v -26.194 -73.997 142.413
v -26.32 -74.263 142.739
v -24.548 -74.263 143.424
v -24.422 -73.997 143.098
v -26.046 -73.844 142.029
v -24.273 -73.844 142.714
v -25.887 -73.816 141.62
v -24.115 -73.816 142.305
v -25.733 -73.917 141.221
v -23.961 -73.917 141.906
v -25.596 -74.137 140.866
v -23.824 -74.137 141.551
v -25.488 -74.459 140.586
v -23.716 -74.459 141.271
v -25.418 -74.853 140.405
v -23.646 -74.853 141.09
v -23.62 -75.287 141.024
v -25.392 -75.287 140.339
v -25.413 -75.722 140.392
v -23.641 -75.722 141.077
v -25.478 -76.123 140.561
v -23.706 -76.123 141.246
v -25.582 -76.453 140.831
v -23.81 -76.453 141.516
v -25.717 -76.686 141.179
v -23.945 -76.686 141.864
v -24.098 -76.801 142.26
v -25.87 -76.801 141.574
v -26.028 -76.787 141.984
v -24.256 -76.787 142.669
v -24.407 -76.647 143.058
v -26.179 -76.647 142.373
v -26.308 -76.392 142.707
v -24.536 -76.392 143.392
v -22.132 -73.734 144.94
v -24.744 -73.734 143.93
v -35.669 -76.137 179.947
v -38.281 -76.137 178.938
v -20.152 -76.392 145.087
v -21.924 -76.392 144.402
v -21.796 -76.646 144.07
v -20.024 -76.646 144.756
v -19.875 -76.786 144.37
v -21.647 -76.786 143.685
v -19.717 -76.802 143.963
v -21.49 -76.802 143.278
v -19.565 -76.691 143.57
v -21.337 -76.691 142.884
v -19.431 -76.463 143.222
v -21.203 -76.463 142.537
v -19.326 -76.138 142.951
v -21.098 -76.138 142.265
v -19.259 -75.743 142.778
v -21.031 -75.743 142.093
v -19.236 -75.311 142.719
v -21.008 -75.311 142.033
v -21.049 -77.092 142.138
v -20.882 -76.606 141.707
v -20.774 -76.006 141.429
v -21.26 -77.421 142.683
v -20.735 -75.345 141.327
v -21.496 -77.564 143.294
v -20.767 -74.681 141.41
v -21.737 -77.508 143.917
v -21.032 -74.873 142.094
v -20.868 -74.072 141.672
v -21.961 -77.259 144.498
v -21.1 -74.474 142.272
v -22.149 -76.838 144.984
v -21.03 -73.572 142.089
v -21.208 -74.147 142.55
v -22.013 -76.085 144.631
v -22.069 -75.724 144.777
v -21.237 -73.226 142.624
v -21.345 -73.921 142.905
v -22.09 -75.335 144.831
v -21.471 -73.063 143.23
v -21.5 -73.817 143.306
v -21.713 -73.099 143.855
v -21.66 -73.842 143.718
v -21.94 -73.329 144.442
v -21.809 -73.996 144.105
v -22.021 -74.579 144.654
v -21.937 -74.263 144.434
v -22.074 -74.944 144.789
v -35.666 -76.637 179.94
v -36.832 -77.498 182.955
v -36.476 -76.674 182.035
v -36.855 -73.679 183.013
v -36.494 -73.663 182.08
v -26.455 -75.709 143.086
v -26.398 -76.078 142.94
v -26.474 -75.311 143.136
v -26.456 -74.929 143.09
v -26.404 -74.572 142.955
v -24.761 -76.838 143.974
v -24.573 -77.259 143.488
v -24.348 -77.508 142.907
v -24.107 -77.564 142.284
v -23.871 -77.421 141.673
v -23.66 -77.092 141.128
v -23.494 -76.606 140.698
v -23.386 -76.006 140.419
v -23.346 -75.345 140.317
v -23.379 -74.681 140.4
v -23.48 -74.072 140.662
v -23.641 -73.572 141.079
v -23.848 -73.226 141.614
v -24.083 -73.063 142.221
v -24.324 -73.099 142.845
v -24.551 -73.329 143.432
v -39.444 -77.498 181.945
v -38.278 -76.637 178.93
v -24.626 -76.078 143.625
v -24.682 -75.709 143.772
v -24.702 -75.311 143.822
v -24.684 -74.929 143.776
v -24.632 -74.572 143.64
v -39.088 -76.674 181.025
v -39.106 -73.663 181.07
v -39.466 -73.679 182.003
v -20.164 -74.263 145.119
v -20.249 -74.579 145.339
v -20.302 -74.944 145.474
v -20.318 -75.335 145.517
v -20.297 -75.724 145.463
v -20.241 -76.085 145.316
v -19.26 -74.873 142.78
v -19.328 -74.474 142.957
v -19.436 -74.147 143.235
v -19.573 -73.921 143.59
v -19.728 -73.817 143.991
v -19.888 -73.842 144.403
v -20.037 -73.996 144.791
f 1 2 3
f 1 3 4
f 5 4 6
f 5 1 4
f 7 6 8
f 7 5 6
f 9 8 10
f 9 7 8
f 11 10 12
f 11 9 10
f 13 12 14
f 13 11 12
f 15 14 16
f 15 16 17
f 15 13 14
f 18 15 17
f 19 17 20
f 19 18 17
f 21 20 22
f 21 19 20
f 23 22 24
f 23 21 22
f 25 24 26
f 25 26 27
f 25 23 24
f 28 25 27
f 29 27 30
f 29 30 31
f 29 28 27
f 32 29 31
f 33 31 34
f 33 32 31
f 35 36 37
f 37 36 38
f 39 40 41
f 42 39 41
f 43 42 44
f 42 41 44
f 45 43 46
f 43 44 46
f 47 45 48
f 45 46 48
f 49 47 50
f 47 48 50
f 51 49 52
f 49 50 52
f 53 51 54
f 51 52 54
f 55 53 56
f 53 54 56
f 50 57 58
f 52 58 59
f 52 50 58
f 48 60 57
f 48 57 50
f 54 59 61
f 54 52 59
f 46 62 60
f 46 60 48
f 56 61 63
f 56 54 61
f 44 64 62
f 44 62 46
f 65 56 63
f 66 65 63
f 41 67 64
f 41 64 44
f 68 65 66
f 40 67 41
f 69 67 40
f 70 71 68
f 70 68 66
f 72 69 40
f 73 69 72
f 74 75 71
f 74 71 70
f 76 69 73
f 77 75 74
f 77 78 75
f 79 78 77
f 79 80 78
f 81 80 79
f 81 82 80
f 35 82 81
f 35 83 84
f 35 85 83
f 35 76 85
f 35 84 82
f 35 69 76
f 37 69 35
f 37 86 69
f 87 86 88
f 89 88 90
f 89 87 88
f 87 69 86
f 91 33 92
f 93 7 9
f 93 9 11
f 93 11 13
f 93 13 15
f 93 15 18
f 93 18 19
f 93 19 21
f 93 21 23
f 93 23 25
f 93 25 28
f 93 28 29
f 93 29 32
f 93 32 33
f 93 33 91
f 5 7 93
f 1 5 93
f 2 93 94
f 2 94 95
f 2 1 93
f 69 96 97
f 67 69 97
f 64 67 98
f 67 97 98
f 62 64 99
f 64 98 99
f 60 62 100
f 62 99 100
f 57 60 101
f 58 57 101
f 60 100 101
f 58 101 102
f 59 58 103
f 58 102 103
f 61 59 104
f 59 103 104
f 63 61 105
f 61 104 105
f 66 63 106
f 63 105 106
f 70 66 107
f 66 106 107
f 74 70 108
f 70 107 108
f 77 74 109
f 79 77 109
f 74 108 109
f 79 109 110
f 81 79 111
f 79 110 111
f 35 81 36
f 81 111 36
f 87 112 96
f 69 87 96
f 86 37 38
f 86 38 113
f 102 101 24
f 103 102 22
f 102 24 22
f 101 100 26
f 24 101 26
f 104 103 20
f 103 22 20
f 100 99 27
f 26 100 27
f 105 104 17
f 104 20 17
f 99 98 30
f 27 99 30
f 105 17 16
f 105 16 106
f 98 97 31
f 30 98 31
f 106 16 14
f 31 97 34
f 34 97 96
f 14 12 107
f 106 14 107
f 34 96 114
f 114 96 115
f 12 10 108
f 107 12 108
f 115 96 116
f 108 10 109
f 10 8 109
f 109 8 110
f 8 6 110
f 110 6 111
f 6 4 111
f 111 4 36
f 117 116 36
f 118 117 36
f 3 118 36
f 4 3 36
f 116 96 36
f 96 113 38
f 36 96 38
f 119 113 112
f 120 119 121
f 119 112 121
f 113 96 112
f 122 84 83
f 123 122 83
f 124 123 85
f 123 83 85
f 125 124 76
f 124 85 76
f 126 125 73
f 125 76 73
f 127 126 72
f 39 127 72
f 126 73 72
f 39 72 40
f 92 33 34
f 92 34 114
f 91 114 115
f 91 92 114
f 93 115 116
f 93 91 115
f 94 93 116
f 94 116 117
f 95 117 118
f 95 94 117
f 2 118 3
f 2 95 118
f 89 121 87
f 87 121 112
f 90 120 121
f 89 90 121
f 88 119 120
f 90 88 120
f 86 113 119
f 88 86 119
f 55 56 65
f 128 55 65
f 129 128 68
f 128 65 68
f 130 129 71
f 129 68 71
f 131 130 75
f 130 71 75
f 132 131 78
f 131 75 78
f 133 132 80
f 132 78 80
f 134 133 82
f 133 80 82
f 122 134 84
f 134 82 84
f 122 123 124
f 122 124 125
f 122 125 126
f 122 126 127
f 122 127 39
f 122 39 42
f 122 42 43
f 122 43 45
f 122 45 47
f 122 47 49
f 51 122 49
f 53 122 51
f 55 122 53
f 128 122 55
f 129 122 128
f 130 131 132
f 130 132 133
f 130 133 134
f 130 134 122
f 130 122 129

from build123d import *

# Parameters (mm, degrees)
BASE_DEPTH        = 1.4
BASE_DEPTH_BACK   = 1.4
BOSS_BLOC_G_DEPTH = 1.9
BOSS_START        = 1.9
BOSS_BLOC_D_DEPTH = 1.9


with BuildPart() as part:
    # Esquisse1 → BASE (new, two sides: drawn at the far end of the back side and taken through both)
    with BuildSketch(Plane(origin=(-65.300145961, -64.810459708, 252.692395796), x_dir=(-0.005843789485583505, 0.9998687257320568, 0.015112293915923657), z_dir=(0.9326954207343167, 1.4198852059309815e-15, 0.3606650137471557)).offset(-BASE_DEPTH_BACK)):
        with BuildLine():
            ThreePointArc((-13.905835762, -115.811989231), (-12.476603332, -119.757071622), (-10.803035184, -115.909273542))
            Line((-10.803035184, -115.909273542), (-12.597966981, -78.341921007))
            Line((-12.597966981, -78.341921007), (-13.097966981, -78.341921007))
            Line((-13.097966981, -78.341921007), (-13.097966981, -76.095588858))
            Line((-13.097966981, -76.095588858), (-10.086767597, -76.095588858))
            Line((-10.086767597, -76.095588858), (-10.086767597, -75.095588858))
            Line((-10.086767597, -75.095588858), (-13.905835762, -75.095588858))
            Line((-13.905835762, -75.095588858), (-13.905835762, -115.811989231))
        make_face()
    extrude(amount=BASE_DEPTH + BASE_DEPTH_BACK)

    # Esquisse2 → BOSS BLOC G (add)
    with BuildSketch(Plane(origin=(29.50317012, 0, 11.408613166), x_dir=(0.36066501374715604, 0, -0.9326954207343167), z_dir=(0.9326954207343167, 0, 0.36066501374715604))):
        with BuildLine():
            ThreePointArc((-142.624687975, -74.263433448), (-143.050736773, -75.335140044), (-142.590186903, -76.392479357))
            ThreePointArc((-142.590186903, -76.392479357), (-140.963090095, -76.690850279), (-140.050933684, -75.310835817))
            ThreePointArc((-140.050933684, -75.310835817), (-140.985527386, -73.921477793), (-142.624687975, -74.263433448))
        make_face()
    extrude(amount=BOSS_BLOC_G_DEPTH)

    # Esquisse3 → BOSS BLOC D (add)
    with BuildSketch(Plane(origin=(26.891622942, 0, 10.398751127), x_dir=(-0.36066501374715587, 0, 0.9326954207343167), z_dir=(-0.9326954207343167, 0, -0.36066501374715587)).offset(BOSS_START)):
        with BuildLine():
            ThreePointArc((143.050933684, -75.310835817), (142.940291708, -74.745429519), (142.624687975, -74.263433448))
            ThreePointArc((142.624687975, -74.263433448), (140.051130596, -75.28653159), (142.590186903, -76.392479357))
            ThreePointArc((142.590186903, -76.392479357), (142.930948146, -75.898679407), (143.050933684, -75.310835817))
        make_face()
    extrude(amount=-BOSS_BLOC_D_DEPTH)


solid = part.part
